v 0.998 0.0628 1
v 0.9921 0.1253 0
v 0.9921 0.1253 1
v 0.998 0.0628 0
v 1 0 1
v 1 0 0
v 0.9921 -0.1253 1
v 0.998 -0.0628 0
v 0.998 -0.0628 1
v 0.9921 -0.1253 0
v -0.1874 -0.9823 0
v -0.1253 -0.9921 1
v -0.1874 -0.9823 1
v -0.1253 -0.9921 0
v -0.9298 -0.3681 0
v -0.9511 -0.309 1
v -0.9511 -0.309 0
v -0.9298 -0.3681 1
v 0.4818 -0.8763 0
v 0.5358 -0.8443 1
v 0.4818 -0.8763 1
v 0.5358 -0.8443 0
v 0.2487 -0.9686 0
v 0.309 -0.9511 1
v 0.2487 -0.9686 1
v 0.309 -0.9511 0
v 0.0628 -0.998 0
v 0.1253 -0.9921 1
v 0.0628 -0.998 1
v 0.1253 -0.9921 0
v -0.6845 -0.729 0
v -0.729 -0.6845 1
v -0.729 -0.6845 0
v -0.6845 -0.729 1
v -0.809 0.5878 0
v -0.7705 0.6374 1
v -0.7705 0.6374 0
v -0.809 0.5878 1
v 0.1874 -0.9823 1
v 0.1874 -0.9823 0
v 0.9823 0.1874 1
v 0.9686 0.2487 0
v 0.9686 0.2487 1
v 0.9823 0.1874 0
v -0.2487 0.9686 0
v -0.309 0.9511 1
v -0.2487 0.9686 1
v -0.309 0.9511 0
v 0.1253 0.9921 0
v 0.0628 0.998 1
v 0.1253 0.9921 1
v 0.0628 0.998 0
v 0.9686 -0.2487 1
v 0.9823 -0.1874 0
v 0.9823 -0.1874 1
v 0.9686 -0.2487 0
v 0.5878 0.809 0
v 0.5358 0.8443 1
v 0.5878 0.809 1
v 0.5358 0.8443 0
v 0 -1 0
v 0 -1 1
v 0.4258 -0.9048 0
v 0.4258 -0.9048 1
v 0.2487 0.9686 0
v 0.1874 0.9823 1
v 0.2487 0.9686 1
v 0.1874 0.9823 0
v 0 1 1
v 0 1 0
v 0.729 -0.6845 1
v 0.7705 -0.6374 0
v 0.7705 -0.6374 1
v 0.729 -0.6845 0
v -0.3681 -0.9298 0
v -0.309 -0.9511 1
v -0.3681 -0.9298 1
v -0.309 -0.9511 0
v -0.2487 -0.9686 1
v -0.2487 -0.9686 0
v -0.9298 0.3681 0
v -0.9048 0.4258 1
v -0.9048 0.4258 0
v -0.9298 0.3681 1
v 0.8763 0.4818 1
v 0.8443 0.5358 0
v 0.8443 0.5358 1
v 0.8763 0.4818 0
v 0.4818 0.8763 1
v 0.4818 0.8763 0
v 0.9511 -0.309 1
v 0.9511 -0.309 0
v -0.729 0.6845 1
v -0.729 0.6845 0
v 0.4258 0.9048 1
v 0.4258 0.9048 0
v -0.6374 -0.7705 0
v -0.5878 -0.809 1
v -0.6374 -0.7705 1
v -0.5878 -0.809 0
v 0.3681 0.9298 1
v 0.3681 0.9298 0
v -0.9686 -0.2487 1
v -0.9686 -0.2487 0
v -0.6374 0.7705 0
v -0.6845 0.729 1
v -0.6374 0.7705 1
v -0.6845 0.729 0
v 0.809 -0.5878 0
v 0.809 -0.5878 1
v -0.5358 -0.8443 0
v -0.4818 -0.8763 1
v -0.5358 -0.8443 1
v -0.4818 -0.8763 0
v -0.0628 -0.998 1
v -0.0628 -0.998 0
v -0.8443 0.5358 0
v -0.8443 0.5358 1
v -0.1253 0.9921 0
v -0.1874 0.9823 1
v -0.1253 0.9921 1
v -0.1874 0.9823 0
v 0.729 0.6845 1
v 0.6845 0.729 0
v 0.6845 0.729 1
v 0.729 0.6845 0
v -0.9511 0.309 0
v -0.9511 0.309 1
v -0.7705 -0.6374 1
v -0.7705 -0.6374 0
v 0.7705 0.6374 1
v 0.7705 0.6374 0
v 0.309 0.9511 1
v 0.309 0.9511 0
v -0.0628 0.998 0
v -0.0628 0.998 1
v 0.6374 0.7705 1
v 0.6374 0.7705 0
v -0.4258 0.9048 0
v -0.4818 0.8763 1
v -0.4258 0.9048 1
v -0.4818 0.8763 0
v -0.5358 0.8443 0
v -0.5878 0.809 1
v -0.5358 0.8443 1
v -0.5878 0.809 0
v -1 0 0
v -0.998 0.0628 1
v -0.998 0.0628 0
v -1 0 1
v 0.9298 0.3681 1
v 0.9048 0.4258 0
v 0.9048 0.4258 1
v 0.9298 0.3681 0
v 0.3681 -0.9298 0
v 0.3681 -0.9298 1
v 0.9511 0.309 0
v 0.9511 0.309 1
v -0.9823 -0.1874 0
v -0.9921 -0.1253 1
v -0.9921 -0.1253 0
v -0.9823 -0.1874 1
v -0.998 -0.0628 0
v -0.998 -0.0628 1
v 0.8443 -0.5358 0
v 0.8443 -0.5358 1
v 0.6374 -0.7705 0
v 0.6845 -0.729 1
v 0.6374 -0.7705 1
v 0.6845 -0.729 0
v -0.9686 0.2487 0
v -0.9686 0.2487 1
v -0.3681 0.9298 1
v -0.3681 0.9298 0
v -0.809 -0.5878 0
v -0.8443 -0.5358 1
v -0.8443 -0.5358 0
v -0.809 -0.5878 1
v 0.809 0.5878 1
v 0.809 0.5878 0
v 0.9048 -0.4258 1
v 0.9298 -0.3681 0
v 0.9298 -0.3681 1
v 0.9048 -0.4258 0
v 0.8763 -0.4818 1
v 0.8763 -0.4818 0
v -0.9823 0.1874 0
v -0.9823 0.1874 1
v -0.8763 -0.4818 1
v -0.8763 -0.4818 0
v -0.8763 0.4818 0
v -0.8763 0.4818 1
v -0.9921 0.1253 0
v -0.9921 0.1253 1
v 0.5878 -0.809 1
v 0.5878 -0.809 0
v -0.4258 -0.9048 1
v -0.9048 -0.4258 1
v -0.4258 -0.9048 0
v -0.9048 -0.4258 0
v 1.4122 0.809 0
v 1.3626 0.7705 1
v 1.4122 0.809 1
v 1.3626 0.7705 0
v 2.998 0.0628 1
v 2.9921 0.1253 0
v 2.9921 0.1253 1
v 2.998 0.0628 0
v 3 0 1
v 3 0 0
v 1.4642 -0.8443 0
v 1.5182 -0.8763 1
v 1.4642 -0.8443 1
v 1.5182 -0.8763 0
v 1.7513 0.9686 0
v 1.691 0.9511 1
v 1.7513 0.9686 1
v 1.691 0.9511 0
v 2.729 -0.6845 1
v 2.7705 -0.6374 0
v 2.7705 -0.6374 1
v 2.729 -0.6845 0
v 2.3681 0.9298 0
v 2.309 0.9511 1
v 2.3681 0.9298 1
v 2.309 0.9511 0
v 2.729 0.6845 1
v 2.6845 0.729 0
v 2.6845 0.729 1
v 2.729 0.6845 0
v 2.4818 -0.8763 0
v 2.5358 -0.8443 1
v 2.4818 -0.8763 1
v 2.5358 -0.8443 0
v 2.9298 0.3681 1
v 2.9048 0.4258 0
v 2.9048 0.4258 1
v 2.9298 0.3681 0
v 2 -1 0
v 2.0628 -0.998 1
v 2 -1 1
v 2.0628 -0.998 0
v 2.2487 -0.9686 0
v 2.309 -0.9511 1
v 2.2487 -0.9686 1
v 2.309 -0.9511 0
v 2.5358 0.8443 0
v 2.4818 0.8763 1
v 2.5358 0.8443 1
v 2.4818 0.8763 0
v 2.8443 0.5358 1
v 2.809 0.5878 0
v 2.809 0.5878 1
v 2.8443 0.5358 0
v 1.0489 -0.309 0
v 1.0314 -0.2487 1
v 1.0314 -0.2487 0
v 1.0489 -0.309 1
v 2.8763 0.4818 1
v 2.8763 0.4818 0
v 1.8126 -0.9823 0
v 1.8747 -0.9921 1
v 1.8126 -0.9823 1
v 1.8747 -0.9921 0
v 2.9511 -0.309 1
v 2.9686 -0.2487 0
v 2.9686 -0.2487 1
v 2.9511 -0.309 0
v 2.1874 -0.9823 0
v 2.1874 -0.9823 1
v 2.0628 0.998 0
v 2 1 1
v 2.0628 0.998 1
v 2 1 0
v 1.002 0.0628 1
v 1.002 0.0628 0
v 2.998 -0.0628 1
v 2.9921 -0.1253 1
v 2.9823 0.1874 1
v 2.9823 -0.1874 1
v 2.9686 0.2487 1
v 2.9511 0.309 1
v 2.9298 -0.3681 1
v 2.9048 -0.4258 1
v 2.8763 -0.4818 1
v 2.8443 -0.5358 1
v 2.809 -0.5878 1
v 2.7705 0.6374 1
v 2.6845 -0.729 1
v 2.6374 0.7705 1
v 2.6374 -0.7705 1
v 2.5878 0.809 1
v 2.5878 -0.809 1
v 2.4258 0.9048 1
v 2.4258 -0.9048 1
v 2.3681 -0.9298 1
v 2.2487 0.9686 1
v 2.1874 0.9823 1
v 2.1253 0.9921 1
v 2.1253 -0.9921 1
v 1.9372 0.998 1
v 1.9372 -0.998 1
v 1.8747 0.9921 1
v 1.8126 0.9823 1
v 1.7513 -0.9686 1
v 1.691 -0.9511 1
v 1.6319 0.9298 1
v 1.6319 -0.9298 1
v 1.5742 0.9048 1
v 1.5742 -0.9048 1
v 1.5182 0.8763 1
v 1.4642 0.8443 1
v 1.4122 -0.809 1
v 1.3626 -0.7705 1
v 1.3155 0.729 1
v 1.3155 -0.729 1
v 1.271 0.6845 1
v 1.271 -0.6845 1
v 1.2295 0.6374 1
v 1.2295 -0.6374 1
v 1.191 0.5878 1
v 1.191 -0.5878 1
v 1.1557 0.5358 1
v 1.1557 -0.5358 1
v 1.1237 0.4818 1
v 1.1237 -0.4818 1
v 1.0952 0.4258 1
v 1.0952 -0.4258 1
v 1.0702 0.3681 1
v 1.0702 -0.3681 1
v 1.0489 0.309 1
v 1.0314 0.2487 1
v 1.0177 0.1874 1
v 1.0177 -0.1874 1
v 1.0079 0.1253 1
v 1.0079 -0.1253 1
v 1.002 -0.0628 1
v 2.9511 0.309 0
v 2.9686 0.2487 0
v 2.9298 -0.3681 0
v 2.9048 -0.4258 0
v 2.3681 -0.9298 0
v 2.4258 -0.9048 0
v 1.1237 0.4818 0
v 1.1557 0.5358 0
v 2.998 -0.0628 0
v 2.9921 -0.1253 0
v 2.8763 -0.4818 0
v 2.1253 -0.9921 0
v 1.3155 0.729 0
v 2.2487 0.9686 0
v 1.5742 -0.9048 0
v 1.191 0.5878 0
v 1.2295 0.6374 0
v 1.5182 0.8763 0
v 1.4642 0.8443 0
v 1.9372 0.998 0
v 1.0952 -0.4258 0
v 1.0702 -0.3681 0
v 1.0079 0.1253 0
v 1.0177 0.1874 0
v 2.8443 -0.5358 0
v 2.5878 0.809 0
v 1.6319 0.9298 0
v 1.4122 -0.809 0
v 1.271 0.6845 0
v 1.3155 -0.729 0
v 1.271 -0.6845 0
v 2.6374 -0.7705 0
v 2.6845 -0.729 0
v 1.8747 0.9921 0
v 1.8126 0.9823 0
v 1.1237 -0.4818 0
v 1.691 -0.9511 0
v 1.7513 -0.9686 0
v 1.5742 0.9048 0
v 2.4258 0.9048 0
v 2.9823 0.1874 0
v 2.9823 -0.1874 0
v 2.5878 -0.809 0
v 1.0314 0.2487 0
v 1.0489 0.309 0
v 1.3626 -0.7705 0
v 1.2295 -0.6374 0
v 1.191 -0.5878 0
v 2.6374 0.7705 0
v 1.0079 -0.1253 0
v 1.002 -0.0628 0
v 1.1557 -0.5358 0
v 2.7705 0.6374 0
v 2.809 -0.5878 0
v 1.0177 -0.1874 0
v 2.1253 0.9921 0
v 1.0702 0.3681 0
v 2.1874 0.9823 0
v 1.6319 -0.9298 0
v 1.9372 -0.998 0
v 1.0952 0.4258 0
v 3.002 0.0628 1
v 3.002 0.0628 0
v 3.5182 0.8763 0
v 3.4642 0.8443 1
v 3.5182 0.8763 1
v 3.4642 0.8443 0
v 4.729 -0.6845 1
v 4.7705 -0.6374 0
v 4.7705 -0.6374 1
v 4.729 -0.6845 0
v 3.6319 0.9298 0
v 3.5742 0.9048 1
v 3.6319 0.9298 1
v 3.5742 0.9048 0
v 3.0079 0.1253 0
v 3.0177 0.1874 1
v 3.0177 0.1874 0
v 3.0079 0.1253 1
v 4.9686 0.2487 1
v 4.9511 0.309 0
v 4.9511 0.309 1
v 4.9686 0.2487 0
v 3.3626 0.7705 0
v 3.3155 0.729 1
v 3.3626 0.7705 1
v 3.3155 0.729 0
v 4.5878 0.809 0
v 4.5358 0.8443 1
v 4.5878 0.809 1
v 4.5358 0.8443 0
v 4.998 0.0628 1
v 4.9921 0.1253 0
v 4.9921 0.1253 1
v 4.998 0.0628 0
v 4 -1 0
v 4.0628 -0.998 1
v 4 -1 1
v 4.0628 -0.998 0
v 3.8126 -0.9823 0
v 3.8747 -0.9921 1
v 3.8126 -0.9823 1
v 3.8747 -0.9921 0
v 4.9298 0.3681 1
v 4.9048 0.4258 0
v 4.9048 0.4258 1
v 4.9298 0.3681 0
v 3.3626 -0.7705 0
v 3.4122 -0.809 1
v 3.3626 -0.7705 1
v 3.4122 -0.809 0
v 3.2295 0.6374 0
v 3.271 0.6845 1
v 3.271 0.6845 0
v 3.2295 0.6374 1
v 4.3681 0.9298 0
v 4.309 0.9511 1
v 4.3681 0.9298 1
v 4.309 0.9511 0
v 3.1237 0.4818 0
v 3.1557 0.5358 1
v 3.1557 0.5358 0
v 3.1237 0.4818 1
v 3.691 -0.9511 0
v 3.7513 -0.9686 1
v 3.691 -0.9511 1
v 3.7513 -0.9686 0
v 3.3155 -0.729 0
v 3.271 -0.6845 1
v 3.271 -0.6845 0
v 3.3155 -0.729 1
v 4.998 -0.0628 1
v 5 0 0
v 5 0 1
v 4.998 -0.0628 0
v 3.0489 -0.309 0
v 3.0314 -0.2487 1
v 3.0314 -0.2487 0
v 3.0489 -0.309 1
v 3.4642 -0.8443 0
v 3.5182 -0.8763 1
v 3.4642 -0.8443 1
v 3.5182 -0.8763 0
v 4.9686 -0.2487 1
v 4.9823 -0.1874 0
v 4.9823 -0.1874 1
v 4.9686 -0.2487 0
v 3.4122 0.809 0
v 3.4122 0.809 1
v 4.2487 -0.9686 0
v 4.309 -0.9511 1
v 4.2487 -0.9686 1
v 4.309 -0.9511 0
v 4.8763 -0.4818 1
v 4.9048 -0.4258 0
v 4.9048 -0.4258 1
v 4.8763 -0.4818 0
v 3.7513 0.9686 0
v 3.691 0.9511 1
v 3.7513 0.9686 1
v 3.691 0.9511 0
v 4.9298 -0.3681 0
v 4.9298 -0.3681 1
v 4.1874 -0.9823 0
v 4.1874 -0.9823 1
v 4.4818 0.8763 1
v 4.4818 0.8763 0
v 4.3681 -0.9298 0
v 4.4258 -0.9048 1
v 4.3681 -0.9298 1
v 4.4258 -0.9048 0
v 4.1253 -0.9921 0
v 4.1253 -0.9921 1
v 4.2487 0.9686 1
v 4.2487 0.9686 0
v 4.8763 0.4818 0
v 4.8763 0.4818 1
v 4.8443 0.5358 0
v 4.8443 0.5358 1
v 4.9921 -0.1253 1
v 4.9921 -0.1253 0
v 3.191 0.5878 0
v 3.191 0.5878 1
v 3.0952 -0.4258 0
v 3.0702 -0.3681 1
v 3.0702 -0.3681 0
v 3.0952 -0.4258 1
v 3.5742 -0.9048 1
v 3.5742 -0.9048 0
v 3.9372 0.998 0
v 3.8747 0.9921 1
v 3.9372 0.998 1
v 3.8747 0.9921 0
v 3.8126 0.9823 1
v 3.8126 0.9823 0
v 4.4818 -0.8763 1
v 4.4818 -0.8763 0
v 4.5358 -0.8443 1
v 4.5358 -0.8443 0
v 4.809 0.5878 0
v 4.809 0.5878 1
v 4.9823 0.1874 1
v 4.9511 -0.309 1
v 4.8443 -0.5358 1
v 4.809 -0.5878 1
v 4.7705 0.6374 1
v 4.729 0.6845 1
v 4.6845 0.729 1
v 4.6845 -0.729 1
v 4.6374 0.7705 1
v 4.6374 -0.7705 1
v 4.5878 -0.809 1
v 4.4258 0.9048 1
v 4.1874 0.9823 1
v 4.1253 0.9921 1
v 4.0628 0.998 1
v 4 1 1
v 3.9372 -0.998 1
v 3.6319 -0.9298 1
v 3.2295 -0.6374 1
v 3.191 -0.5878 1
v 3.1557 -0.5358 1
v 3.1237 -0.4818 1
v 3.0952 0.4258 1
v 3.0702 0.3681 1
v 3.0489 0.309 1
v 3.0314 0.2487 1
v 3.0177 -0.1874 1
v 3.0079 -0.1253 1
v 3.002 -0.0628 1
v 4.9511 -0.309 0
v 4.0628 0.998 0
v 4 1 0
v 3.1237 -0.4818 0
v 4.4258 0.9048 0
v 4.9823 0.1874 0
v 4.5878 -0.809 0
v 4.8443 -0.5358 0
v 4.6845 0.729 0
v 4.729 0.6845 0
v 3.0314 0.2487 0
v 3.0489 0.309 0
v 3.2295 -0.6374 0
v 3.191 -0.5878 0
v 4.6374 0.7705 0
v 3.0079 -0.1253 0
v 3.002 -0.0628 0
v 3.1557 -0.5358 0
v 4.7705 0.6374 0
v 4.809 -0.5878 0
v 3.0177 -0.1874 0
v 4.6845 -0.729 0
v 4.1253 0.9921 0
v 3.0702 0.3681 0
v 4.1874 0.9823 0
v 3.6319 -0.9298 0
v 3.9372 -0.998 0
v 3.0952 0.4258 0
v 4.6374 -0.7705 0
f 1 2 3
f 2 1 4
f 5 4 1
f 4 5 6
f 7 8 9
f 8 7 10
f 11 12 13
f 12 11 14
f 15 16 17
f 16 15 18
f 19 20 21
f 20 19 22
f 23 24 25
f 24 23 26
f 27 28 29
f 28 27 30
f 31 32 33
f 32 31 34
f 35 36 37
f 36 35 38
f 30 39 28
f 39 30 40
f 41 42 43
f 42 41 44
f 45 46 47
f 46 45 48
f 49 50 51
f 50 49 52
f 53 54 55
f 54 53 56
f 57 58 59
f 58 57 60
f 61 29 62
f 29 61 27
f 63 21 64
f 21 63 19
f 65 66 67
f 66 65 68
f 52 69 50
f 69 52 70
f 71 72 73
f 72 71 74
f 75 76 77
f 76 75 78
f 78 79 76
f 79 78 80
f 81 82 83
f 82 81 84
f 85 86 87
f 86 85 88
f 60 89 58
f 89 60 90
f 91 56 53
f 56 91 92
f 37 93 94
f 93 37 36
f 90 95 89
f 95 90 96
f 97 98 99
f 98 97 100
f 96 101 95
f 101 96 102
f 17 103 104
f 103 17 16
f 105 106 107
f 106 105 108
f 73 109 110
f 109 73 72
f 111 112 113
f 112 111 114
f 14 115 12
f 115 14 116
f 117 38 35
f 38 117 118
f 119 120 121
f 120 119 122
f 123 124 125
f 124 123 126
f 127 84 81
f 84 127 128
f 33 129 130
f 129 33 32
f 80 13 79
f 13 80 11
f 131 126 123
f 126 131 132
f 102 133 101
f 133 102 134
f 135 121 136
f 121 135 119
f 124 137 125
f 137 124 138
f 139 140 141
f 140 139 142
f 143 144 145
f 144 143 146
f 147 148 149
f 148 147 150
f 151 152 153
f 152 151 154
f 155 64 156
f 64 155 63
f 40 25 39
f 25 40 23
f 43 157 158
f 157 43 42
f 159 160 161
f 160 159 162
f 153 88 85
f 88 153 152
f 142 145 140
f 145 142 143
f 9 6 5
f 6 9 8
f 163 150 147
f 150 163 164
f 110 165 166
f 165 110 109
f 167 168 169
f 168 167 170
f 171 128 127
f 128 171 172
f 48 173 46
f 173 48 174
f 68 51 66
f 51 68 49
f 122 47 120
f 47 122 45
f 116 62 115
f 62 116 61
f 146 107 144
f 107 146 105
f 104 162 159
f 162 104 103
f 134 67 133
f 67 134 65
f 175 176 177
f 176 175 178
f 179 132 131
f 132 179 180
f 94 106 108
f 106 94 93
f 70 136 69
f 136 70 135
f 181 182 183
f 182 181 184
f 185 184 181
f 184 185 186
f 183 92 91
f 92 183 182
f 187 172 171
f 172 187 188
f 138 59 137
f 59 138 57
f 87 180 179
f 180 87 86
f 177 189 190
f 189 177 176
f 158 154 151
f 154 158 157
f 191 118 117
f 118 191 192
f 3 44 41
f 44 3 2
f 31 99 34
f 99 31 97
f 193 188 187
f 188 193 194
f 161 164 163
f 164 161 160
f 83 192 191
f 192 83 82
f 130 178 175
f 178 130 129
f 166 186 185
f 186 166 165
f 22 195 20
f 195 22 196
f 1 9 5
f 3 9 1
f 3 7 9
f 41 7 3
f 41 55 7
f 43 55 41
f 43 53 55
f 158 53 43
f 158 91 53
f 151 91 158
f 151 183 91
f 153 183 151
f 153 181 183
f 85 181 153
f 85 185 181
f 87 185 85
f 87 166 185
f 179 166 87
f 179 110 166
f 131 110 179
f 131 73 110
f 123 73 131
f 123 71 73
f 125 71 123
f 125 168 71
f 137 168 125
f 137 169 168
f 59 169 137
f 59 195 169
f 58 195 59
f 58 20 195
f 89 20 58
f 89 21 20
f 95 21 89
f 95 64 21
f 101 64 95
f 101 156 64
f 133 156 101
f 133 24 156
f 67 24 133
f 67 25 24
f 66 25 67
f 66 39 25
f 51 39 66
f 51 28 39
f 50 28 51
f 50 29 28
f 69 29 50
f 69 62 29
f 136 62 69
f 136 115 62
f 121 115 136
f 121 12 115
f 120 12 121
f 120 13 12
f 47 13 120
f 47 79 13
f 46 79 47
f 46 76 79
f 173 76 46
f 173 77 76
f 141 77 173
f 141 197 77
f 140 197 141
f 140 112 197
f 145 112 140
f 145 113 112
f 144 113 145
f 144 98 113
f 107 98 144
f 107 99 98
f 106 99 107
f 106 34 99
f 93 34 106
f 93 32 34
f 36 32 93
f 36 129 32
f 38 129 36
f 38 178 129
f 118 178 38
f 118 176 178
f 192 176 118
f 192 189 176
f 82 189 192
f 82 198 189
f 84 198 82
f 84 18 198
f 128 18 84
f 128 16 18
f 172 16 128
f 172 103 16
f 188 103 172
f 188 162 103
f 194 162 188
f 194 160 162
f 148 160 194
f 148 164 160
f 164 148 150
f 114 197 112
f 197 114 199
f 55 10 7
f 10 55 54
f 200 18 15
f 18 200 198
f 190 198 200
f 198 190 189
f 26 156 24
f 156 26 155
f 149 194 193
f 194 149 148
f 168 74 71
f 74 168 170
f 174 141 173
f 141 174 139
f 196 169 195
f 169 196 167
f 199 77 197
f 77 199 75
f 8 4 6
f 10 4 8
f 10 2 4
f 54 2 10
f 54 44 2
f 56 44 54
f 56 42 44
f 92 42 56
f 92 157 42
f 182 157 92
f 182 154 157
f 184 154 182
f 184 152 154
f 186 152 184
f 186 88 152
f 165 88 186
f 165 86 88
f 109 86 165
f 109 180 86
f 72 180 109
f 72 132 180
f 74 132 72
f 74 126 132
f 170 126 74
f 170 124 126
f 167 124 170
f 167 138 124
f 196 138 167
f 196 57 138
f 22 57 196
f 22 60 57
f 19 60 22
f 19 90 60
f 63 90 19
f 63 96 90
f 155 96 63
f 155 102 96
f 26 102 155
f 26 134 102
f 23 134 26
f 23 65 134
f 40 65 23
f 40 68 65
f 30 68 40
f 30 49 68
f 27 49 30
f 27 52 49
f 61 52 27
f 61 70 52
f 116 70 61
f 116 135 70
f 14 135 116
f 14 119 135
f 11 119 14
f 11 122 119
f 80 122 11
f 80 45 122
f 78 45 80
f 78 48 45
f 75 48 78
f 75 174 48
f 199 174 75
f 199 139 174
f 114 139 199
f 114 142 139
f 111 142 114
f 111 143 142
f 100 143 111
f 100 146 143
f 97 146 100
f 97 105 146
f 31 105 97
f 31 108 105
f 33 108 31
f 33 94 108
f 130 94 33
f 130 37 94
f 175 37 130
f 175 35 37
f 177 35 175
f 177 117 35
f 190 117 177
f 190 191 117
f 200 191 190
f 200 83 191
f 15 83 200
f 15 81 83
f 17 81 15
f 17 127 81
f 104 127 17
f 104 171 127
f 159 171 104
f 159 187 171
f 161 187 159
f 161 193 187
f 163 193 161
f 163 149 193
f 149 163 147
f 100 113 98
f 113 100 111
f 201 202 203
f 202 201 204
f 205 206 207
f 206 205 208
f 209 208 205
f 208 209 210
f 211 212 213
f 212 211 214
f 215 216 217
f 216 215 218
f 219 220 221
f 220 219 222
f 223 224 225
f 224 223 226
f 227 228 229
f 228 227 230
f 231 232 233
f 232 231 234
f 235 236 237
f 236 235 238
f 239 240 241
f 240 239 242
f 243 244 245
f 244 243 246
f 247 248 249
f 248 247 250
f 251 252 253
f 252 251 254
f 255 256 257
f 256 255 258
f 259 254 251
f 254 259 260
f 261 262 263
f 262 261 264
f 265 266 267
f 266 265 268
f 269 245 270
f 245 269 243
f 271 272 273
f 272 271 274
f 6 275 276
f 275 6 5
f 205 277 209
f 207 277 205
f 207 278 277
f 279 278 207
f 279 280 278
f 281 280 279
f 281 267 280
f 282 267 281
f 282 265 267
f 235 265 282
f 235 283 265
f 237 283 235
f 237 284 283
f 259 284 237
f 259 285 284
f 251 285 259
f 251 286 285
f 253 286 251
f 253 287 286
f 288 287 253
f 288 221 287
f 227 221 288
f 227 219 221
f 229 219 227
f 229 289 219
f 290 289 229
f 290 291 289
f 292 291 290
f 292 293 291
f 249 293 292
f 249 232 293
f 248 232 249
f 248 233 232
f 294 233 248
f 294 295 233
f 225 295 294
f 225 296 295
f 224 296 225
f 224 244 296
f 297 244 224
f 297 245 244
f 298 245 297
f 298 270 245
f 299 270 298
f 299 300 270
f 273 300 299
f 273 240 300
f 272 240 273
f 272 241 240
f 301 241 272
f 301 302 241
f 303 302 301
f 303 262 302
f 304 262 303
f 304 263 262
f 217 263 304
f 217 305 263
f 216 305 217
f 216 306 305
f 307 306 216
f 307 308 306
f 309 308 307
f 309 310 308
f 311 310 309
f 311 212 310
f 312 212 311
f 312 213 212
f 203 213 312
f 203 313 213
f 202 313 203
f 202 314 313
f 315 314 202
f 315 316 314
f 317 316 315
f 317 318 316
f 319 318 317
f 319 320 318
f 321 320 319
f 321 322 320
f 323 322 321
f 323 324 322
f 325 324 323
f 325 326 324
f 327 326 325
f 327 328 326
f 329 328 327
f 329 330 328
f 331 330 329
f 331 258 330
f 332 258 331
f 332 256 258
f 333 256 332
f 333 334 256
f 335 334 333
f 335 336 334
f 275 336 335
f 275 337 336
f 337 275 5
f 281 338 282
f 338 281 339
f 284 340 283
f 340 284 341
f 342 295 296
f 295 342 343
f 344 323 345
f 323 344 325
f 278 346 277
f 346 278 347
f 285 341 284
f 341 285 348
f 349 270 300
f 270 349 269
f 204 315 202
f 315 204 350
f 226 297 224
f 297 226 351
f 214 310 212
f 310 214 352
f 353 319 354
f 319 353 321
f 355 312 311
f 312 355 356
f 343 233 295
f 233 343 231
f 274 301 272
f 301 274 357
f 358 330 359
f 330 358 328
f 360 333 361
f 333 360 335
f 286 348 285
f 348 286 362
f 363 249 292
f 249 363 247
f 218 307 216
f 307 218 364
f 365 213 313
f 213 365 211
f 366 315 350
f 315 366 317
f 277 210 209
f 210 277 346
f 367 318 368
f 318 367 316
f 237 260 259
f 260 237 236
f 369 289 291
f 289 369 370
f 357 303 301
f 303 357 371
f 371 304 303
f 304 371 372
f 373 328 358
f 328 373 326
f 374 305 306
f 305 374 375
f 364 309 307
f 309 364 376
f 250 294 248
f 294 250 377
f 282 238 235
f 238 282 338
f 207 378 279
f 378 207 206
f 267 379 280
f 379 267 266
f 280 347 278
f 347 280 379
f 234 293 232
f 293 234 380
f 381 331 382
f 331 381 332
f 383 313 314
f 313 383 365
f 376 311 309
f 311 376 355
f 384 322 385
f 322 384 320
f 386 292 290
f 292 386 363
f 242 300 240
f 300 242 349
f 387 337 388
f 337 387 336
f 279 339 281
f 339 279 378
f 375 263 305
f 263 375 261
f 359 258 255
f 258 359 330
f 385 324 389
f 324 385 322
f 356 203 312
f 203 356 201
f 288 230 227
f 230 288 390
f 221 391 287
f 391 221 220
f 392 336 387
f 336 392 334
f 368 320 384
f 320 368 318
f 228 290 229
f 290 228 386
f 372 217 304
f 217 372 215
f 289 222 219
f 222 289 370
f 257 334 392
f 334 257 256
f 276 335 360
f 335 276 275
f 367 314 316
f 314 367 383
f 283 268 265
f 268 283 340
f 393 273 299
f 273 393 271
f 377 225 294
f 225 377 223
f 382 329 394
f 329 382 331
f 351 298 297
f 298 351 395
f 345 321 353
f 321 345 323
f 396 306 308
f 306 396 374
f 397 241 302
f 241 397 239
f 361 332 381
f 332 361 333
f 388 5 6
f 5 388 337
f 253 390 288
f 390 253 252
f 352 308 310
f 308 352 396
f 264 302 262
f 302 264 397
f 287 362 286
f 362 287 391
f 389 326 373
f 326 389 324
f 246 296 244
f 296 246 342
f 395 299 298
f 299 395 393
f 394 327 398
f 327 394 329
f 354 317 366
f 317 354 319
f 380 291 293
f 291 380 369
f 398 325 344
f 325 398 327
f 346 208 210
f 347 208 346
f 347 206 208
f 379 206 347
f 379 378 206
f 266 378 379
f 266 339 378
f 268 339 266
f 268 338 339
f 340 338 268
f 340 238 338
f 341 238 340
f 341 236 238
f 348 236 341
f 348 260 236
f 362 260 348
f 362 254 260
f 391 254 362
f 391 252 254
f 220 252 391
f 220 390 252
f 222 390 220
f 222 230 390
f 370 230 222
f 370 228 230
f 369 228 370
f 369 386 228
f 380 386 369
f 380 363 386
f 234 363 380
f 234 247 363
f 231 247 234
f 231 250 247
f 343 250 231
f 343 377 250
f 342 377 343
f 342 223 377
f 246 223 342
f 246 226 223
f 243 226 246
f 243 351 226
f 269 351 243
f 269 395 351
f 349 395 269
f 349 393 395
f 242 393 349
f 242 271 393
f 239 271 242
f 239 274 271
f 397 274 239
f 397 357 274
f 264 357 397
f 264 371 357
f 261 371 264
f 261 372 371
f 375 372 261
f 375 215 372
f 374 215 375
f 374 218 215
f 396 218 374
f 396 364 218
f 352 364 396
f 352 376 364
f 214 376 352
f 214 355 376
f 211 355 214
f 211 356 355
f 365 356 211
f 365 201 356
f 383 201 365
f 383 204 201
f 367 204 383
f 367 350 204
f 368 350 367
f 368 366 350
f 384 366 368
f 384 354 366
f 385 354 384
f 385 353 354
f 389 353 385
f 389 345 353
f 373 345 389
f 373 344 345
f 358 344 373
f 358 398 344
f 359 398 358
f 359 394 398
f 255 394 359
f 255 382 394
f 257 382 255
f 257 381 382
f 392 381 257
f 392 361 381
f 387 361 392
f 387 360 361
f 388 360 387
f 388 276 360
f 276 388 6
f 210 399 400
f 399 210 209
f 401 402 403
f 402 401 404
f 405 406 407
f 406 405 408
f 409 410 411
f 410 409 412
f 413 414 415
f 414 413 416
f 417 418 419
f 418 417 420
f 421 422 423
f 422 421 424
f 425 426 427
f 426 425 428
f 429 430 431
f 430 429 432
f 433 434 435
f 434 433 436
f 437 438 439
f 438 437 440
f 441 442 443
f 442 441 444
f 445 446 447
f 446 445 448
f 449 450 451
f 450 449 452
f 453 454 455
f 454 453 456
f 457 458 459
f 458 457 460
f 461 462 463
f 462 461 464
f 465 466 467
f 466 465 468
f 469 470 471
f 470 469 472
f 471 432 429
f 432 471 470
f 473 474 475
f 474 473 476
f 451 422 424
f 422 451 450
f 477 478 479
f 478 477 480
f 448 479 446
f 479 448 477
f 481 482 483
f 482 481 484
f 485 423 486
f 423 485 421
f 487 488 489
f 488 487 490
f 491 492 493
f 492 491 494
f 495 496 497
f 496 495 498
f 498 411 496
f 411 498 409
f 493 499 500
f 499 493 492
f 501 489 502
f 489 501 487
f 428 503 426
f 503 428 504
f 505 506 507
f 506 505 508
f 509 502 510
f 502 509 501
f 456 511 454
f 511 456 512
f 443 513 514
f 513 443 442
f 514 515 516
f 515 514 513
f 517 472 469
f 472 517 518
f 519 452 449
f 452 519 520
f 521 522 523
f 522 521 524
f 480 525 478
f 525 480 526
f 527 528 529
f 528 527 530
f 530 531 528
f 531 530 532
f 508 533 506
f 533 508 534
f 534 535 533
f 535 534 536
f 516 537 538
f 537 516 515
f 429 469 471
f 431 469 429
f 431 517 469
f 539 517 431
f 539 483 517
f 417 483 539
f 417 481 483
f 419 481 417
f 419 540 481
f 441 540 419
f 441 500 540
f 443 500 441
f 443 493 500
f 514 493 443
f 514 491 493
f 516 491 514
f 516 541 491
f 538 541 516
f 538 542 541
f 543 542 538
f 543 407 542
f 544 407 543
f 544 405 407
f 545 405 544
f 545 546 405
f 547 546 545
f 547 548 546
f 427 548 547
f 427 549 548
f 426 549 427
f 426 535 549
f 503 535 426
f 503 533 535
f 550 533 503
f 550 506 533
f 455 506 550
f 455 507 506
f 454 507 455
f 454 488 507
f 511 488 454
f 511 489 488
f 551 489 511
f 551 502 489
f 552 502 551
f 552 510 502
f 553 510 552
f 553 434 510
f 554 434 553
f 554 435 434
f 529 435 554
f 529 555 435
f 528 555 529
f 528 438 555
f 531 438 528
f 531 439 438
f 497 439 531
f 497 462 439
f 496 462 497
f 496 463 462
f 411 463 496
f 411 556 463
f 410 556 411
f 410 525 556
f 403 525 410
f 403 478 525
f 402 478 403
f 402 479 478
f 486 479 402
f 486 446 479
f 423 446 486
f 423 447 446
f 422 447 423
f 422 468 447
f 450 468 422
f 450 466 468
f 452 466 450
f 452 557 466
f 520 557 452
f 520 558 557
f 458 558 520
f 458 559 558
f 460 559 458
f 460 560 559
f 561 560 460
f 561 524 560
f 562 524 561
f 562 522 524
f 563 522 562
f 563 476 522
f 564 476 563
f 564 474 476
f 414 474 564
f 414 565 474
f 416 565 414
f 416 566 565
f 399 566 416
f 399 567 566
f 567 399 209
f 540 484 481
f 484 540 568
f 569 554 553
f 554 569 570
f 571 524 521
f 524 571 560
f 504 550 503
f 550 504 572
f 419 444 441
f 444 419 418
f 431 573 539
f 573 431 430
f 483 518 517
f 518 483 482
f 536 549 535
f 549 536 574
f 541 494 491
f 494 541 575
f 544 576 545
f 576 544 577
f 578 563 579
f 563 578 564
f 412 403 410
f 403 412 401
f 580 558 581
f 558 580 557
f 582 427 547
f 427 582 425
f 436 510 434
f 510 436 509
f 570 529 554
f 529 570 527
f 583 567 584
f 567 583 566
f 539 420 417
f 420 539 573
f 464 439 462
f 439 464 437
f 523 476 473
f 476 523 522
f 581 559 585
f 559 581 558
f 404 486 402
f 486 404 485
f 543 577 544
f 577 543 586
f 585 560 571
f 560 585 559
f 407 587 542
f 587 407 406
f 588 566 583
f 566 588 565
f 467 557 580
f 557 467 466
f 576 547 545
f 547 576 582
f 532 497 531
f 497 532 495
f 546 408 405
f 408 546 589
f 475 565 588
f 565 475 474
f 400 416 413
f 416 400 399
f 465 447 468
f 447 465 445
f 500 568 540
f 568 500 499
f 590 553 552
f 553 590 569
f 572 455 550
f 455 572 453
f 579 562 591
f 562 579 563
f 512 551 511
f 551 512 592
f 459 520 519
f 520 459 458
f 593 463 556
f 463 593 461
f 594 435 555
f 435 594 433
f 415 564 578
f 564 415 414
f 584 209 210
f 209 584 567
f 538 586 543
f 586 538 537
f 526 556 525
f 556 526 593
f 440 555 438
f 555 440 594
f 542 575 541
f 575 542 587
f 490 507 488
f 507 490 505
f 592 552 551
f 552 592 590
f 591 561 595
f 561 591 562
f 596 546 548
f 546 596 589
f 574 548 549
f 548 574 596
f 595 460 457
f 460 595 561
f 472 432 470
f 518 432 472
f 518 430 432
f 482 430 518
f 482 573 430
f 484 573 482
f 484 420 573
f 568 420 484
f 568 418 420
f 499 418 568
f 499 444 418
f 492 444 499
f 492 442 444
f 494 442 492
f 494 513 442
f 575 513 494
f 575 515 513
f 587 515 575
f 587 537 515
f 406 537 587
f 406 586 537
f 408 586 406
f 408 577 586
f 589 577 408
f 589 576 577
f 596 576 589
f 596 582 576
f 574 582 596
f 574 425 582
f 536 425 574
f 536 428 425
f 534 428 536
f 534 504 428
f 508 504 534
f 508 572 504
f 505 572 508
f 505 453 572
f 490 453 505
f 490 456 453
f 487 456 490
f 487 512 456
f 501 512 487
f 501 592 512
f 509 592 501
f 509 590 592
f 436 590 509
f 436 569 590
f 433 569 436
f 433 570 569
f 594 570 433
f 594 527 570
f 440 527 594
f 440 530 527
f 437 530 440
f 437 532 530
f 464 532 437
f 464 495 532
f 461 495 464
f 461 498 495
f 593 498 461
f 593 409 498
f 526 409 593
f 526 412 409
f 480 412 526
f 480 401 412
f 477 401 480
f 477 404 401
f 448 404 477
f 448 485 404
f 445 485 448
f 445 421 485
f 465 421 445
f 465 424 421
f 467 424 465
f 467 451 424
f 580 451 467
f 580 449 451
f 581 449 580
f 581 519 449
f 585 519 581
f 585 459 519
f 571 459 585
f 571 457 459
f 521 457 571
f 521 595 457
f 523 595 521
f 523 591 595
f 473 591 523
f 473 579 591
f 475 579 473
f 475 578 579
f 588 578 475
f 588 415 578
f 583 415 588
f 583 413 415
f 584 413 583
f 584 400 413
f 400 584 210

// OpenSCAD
$fn = 100;

cylinder();
translate([2, 0, 0]) cylinder();
# translate([4, 0, 0]) cylinder();
% translate([6, 0, 0]) cylinder();
* translate([8, 0, 0]) cylinder();
